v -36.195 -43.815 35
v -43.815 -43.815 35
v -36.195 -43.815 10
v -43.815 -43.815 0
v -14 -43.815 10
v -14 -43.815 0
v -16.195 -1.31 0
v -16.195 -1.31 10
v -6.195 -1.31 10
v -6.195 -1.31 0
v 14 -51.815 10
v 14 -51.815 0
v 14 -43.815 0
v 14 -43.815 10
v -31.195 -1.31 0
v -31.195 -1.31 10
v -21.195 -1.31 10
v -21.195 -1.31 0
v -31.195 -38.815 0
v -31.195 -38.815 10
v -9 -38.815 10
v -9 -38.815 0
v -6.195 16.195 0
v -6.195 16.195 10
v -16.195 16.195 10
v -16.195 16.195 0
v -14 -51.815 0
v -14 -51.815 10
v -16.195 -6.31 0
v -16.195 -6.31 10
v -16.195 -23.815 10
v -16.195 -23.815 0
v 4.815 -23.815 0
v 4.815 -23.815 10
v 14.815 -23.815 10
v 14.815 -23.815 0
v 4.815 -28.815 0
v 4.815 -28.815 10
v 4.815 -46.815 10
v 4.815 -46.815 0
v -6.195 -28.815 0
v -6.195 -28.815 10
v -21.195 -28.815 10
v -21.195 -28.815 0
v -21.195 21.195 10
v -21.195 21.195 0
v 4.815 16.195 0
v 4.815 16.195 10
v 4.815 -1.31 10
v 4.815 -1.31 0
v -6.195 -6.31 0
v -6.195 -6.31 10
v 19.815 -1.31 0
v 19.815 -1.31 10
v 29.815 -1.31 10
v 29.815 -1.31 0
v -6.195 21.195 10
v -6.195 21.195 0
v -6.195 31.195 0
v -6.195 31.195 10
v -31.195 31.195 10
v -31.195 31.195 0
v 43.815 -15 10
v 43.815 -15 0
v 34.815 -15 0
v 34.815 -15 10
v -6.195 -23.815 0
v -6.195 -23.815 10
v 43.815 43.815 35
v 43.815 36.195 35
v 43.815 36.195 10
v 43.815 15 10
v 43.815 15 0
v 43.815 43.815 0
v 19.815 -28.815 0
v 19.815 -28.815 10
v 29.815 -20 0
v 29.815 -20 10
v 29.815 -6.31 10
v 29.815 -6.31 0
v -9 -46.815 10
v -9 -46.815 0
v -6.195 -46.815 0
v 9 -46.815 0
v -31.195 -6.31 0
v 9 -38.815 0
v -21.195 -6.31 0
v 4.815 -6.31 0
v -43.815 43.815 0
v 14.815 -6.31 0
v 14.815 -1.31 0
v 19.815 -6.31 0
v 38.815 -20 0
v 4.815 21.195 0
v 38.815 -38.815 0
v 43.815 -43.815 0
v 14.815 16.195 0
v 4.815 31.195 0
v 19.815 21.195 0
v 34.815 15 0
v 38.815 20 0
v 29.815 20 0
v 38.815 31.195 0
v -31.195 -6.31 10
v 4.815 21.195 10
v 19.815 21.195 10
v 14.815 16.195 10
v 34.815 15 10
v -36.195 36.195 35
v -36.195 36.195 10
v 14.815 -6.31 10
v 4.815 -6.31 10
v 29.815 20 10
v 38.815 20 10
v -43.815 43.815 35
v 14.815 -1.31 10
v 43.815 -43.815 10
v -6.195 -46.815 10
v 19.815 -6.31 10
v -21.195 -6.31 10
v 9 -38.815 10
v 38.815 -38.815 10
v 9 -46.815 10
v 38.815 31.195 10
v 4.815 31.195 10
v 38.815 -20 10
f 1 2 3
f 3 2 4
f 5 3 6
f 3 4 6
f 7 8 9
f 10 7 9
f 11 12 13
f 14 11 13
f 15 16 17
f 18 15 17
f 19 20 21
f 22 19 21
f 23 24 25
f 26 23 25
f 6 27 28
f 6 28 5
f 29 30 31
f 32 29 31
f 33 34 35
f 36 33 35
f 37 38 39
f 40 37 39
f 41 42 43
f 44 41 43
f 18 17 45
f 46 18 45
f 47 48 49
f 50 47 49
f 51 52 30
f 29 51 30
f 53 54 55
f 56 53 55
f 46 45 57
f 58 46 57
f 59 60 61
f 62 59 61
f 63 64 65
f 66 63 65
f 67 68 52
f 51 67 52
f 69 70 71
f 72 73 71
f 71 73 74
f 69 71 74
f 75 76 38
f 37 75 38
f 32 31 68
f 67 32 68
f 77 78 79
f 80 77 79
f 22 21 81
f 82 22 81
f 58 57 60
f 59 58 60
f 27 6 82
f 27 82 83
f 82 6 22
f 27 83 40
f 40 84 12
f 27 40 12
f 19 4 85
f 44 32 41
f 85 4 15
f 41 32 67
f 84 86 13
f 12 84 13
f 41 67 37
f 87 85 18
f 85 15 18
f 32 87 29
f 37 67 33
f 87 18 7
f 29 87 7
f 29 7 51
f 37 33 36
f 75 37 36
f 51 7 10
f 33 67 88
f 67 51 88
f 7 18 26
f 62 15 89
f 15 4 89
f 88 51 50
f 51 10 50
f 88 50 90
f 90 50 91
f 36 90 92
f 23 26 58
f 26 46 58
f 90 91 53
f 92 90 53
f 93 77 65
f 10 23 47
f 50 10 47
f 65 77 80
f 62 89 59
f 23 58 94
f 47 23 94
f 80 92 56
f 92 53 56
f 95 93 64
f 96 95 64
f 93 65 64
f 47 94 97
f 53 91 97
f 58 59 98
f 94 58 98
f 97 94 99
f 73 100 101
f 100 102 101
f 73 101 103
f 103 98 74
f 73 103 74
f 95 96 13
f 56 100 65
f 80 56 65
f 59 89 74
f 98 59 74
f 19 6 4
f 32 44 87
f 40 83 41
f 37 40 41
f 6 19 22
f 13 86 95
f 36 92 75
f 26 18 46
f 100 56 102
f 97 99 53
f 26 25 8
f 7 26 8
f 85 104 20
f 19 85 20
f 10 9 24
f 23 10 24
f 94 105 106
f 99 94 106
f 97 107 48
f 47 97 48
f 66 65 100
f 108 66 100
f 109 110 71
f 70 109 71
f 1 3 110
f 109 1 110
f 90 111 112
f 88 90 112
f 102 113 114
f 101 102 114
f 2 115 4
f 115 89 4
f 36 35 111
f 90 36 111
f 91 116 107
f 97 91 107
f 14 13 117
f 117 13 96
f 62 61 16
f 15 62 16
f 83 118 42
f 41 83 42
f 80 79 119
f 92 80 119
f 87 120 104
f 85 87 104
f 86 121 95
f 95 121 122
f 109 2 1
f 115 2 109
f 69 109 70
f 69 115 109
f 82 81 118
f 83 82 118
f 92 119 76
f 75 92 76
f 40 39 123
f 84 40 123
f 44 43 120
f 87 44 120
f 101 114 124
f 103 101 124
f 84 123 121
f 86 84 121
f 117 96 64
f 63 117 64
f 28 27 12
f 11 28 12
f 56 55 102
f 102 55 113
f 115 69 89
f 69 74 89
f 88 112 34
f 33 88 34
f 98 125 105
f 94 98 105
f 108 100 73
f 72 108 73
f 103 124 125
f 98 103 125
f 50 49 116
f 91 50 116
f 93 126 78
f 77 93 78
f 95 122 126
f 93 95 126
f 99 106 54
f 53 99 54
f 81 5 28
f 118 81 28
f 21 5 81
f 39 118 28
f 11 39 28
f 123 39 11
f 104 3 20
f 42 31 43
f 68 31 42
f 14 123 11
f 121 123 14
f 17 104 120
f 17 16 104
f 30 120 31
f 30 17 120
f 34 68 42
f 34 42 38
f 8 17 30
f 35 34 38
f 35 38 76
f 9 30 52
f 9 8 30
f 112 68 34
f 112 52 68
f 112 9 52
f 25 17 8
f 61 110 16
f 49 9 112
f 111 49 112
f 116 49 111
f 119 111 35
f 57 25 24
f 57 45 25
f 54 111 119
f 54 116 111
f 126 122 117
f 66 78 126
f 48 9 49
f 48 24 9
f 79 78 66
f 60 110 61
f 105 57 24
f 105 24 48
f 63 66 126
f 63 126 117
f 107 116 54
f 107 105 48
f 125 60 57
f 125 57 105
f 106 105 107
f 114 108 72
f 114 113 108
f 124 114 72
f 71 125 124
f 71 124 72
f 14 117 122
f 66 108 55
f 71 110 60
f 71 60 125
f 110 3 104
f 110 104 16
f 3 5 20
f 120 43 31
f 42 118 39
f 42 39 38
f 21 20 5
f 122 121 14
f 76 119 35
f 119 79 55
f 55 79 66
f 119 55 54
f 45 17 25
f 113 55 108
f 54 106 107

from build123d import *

# Parameters (mm, degrees)
F0_W     = 28
F0_H     = 8
F1_DEPTH = 10
F3_DEPTH = 25
F5_DEPTH = 10.001


with BuildPart() as f1:
    # F0 (on Top) → F1 (new body)
    with BuildSketch(Plane.XY):
        with Locations((0, -47.815)):
            Rectangle(F0_W, F0_H)
        Polygon((43.815, 15), (43.815, 43.815), (-43.815, 43.815), (-43.815, -43.815), (-14, -43.815), (-14, -35.815), (14, -35.815), (14, -43.815), (43.815, -43.815), (43.815, -15), (34.815, -15), (34.815, 15), align=None)
        with Locations((0, -39.815)):
            Rectangle(F0_W, F0_H)
    extrude(amount=F1_DEPTH)

    # F2 (on face) → F3 (join)
    with BuildSketch(Plane.XY.offset(10)):
        Polygon((43.815, 36.195), (43.815, 43.815), (-43.815, 43.815), (-43.815, -43.815), (-36.195, -43.815), (-36.195, 36.195), align=None)
    extrude(amount=F3_DEPTH)

    # F4 (on face) → F5 (cut, through all)
    with BuildSketch(Plane.XY.offset(10)):
        Polygon((-6.194999, 21.195), (-6.194999, 31.195), (-31.195, 31.195), (-31.195, -1.31), (-21.195, -1.31), (-21.195, 21.195), align=None)
        Polygon((38.815, 20), (38.815, 31.195), (4.814999, 31.195), (4.814999, 21.195), (19.815, 21.195), (19.815, -1.31), (29.815, -1.31), (29.815, 20), align=None)
        Polygon((14.814999, 16.194999), (4.814999, 16.194999), (4.814999, 6.194999), (4.814999, -1.31), (14.814999, -1.31), align=None)
        Polygon((-6.194999, 6.194999), (-6.194999, 16.194999), (-16.194999, 16.194999), (-16.194999, -1.31), (-6.194999, -1.31), align=None)
        Polygon((-6.194999, -6.31), (-16.194999, -6.31), (-16.194999, -23.814999), (-6.194999, -23.814999), (-6.194999, -13.814999), align=None)
        Polygon((-21.195, -6.31), (-31.195, -6.31), (-31.195, -38.815), (-9, -38.815), (-9, -46.815), (-6.194999, -46.815), (-6.194999, -28.815), (-21.195, -28.815), align=None)
        Polygon((29.815, -20), (29.815, -6.31), (19.815, -6.31), (19.815, -28.815), (4.814999, -28.815), (4.814999, -46.815), (9, -46.815), (9, -38.815), (38.815, -38.815), (38.815, -20), align=None)
        Polygon((14.814999, -23.814999), (14.814999, -6.31), (4.814999, -6.31), (4.814999, -13.814999), (4.814999, -23.814999), align=None)
    extrude(amount=-F5_DEPTH, mode=Mode.SUBTRACT)


solid = f1.part
